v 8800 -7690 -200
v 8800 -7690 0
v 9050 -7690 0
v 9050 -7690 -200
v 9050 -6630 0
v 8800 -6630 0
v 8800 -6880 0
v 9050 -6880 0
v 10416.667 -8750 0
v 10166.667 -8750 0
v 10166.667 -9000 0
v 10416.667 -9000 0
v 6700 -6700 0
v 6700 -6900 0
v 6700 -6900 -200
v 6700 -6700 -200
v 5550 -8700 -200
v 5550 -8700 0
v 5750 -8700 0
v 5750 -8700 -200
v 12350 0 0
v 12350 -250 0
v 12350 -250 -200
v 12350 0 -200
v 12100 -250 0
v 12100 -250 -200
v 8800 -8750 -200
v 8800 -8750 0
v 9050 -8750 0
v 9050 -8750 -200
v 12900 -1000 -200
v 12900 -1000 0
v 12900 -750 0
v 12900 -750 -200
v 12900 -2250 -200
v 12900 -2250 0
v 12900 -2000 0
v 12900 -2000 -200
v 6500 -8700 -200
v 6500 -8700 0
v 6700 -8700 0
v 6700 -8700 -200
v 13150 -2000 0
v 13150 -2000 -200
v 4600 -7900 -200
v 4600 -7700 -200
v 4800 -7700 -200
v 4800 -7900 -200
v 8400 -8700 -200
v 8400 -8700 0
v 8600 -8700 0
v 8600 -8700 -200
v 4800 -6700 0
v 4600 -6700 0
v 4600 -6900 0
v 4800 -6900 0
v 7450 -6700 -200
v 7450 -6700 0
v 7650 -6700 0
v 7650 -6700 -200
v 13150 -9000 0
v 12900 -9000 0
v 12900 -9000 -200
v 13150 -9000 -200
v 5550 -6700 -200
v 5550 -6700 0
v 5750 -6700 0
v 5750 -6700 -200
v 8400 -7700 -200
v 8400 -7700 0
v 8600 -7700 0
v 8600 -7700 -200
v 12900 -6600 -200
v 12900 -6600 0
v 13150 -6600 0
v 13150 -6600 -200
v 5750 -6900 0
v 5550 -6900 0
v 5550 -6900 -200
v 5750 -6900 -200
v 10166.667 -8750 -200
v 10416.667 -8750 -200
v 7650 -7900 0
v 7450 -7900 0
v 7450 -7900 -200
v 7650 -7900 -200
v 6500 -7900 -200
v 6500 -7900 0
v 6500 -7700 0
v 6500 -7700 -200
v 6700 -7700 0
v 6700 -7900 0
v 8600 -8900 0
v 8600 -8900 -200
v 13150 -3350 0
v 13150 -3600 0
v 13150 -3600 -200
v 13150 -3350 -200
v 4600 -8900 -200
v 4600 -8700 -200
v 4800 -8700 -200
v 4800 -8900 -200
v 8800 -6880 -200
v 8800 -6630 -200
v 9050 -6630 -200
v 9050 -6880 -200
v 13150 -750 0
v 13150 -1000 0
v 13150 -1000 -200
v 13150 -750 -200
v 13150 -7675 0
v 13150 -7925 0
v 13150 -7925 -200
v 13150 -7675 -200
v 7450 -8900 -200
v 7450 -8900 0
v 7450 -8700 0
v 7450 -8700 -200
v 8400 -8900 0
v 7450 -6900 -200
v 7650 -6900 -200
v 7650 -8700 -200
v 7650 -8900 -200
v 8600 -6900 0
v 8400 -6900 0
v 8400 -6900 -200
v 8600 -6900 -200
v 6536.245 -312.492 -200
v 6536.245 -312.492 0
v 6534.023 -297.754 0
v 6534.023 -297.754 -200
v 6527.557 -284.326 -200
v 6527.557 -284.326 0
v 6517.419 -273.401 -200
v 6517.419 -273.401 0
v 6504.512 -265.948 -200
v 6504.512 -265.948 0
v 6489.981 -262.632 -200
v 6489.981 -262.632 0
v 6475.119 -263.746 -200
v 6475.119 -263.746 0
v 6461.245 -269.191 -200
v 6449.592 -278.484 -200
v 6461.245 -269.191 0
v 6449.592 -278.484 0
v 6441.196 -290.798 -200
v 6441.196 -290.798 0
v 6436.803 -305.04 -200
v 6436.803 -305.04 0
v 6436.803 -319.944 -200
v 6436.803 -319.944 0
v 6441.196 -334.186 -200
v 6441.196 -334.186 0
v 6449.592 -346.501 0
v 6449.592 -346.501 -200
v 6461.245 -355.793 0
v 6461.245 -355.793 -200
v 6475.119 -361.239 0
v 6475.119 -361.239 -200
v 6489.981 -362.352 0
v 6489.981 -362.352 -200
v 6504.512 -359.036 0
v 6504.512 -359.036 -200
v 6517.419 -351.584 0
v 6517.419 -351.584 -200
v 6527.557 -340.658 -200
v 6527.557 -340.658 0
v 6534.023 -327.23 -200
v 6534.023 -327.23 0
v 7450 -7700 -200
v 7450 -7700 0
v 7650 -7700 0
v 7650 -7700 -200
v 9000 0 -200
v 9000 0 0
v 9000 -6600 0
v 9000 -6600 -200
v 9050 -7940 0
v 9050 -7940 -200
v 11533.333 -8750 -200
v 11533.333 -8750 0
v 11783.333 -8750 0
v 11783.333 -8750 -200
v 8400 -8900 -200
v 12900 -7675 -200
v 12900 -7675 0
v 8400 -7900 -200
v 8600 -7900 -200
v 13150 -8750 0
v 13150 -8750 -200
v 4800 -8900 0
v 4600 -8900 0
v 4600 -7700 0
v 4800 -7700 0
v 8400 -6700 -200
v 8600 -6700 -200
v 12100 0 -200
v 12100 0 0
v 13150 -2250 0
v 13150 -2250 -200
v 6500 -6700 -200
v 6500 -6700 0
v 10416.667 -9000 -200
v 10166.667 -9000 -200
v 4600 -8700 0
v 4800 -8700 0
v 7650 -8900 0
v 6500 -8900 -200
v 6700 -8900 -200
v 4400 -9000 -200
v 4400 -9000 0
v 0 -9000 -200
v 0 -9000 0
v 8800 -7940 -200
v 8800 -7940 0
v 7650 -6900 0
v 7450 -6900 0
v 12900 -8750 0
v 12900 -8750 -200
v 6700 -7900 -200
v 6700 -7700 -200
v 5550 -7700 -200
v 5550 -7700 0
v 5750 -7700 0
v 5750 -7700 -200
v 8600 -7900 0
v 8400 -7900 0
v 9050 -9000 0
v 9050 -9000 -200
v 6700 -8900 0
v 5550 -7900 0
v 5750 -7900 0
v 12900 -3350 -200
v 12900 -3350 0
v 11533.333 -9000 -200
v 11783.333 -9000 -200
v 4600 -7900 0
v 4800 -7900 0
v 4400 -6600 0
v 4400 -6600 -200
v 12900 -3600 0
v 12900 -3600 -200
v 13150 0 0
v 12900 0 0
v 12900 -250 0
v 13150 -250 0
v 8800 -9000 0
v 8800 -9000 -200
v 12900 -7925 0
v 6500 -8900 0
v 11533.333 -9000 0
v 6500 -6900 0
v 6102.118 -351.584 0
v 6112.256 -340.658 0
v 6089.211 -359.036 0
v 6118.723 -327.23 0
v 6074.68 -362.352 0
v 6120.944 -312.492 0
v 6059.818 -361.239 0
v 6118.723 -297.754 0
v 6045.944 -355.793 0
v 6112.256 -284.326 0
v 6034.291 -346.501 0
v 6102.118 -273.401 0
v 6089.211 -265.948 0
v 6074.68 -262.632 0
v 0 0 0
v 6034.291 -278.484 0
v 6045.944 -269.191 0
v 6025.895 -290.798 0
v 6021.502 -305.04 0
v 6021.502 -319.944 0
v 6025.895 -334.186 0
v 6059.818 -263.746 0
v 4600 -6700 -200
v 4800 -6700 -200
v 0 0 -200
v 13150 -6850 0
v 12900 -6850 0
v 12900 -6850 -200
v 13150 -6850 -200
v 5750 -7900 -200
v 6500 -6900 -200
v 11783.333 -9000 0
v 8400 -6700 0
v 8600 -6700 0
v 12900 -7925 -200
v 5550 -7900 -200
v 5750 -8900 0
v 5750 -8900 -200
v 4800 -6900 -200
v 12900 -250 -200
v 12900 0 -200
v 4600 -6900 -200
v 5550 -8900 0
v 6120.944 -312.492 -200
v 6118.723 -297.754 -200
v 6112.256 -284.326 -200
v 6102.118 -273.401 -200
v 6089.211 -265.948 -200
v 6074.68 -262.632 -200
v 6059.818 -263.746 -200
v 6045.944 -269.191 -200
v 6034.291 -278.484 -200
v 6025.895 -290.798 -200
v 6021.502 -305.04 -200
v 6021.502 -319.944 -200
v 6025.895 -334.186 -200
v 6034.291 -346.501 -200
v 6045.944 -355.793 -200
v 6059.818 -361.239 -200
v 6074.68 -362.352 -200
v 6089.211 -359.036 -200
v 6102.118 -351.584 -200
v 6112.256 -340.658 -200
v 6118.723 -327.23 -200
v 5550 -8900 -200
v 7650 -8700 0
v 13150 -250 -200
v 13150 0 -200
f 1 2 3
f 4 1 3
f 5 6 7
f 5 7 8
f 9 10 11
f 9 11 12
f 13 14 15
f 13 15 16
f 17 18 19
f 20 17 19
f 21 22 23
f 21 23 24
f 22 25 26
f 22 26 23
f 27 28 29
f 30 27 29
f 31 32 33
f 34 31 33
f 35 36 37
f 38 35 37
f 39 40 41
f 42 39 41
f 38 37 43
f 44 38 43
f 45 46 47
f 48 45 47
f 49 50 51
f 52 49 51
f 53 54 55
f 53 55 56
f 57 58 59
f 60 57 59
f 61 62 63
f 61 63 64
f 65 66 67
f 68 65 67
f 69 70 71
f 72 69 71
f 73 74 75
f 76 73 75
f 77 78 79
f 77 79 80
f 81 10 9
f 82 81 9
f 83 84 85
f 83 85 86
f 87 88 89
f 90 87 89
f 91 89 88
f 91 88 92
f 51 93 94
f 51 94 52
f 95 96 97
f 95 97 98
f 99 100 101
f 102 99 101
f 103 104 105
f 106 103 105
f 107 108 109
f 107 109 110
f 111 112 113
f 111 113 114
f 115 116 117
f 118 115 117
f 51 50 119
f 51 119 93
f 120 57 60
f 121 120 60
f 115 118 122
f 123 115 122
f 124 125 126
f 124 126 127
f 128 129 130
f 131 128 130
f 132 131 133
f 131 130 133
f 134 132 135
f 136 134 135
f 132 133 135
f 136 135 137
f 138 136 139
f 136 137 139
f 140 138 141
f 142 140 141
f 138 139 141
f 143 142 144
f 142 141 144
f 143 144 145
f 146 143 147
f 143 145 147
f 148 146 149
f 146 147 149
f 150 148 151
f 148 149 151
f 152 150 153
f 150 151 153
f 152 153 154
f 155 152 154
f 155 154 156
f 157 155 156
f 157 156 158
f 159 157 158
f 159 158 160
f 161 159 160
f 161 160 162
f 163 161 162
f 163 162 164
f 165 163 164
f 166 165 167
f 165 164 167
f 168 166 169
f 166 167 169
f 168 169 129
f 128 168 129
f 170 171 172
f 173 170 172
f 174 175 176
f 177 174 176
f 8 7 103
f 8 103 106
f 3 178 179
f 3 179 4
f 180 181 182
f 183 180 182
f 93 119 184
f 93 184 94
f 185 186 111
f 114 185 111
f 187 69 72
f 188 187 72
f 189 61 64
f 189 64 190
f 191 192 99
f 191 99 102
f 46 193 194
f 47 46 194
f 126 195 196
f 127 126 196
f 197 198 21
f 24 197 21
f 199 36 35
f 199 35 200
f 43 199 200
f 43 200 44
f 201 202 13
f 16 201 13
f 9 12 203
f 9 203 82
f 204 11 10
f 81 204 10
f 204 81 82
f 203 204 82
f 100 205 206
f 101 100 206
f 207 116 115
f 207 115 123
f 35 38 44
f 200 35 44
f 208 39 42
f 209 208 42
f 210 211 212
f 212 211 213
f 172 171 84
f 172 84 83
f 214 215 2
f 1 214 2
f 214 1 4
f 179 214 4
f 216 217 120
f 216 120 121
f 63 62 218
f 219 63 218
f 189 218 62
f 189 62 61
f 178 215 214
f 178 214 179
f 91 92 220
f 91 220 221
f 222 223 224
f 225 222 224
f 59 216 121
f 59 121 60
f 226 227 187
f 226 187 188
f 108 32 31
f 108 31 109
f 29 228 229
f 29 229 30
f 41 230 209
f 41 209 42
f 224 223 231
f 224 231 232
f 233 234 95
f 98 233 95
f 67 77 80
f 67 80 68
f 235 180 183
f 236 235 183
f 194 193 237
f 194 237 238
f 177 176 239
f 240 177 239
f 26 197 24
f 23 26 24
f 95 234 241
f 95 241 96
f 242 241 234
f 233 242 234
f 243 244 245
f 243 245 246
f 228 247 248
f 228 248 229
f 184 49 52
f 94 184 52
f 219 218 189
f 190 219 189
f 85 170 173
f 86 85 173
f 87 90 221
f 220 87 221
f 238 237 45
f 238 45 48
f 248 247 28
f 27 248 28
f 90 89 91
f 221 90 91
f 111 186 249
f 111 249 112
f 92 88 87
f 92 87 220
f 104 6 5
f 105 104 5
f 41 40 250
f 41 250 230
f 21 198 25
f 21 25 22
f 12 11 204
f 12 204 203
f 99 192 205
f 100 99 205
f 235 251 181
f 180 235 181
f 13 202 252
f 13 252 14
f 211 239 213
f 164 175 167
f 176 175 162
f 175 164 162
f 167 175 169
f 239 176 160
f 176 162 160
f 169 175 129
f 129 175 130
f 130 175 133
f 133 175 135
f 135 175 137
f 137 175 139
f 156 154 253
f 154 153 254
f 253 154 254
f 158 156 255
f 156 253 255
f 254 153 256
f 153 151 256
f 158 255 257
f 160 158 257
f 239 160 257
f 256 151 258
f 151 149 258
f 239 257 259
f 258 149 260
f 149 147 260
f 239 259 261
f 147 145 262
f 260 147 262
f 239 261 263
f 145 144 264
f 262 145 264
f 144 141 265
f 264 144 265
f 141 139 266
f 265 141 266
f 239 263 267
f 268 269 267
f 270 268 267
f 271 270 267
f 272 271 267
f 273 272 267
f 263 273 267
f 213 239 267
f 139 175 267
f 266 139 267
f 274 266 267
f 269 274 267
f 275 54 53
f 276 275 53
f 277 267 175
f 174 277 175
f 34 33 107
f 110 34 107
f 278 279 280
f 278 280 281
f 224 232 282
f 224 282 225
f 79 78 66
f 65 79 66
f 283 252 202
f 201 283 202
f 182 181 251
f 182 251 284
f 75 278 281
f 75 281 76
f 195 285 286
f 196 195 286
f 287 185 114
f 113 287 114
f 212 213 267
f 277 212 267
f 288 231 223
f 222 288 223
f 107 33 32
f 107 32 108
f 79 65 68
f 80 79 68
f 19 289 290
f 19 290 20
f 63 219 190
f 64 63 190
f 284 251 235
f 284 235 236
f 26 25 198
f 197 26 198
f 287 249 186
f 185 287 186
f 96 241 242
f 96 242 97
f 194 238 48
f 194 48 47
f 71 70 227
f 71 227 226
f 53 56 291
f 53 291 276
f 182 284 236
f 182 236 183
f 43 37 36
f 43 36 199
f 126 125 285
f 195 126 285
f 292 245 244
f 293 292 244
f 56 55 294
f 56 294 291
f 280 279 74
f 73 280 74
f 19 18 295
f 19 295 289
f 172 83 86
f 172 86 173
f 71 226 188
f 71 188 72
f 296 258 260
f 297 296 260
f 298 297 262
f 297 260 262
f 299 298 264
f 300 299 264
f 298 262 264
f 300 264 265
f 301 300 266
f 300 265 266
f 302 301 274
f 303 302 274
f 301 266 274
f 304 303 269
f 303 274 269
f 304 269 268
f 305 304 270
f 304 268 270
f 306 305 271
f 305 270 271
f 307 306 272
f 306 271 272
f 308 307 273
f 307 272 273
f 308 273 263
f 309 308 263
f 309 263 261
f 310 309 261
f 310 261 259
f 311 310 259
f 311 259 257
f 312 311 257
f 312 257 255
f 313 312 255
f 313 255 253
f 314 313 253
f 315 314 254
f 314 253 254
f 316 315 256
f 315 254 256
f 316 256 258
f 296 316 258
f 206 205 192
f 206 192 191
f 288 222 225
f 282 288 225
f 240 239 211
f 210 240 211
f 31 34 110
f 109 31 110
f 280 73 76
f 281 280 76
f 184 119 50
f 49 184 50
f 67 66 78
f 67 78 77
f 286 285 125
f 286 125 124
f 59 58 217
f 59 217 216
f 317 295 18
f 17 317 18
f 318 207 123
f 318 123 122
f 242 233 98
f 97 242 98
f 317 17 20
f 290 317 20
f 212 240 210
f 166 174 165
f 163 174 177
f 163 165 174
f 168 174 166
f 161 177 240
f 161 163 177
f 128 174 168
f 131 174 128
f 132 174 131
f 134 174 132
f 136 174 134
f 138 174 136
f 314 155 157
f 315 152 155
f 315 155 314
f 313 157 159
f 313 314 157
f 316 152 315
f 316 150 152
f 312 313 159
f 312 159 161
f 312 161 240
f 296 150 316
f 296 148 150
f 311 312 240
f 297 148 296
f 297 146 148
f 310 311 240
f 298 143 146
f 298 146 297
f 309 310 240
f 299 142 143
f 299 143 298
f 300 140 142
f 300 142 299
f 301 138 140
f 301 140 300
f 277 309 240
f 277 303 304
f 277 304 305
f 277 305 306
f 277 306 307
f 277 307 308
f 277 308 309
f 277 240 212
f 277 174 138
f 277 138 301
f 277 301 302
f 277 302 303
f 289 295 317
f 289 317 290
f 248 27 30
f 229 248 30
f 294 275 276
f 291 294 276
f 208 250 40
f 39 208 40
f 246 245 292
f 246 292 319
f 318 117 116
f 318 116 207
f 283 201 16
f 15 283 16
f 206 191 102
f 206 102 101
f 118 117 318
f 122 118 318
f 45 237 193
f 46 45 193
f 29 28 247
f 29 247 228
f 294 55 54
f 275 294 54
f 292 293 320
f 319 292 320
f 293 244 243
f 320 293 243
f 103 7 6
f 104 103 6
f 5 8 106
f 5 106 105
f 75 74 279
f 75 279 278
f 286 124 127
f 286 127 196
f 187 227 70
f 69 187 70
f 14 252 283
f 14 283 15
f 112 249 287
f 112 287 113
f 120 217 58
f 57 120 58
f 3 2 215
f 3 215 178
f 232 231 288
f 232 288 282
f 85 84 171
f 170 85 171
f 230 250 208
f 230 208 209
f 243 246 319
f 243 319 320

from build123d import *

# Parameters (mm, degrees)
SKETCH_1_R         = 50
EXTRUDE_1_DEPTH    = 200
SKETCH_1_W         = 250
SKETCH_1_H         = 250
EXTRUDE_1_2_DEPTH  = 200
EXTRUDE_1_3_DEPTH  = 200
EXTRUDE_1_4_DEPTH  = 200
EXTRUDE_1_5_DEPTH  = 200
EXTRUDE_1_6_DEPTH  = 200
EXTRUDE_1_7_DEPTH  = 200
EXTRUDE_1_8_DEPTH  = 200
EXTRUDE_1_9_DEPTH  = 200
EXTRUDE_1_10_DEPTH = 200
EXTRUDE_1_11_DEPTH = 200
EXTRUDE_1_12_DEPTH = 200
EXTRUDE_1_13_DEPTH = 200
EXTRUDE_1_14_DEPTH = 200
SKETCH_1_W_2       = 200
SKETCH_1_H_2       = 200
EXTRUDE_1_15_DEPTH = 200
EXTRUDE_1_16_DEPTH = 200
EXTRUDE_1_17_DEPTH = 200
EXTRUDE_1_18_DEPTH = 200
EXTRUDE_1_19_DEPTH = 200
EXTRUDE_1_20_DEPTH = 200
EXTRUDE_1_21_DEPTH = 200
EXTRUDE_1_22_DEPTH = 200
EXTRUDE_1_23_DEPTH = 200
EXTRUDE_1_24_DEPTH = 200
EXTRUDE_1_25_DEPTH = 200
EXTRUDE_1_26_DEPTH = 200
EXTRUDE_1_27_DEPTH = 200
EXTRUDE_1_28_DEPTH = 200
EXTRUDE_1_29_DEPTH = 200


with BuildPart() as part:
    # Эскиз1 → Бобышка-Вытянуть1 (new body)
    with BuildSketch(Plane.XY):
        Polygon((0, 0), (9000, 0), (9000, -6600), (4400, -6600), (4400, -9000), (0, -9000), align=None)
        with Locations((6486.244831881, -312.492160742)):
            Circle(SKETCH_1_R, mode=Mode.SUBTRACT)
        with Locations((6070.943926101, -312.492160742)):
            Circle(SKETCH_1_R, mode=Mode.SUBTRACT)
    extrude(amount=-EXTRUDE_1_DEPTH)


with BuildPart() as body_2:
    # Эскиз1 → Extrude 1 2 (new body)
    with BuildSketch(Plane.XY):
        with Locations((8925, -8875)):
            Rectangle(SKETCH_1_W, SKETCH_1_H)
    extrude(amount=-EXTRUDE_1_2_DEPTH)


with BuildPart() as body_3:
    # Эскиз1 → Extrude 1 3 (new body)
    with BuildSketch(Plane.XY):
        with Locations((8925, -6755)):
            Rectangle(SKETCH_1_W, SKETCH_1_H)
    extrude(amount=-EXTRUDE_1_3_DEPTH)


with BuildPart() as body_4:
    # Эскиз1 → Extrude 1 4 (new body)
    with BuildSketch(Plane.XY):
        with Locations((8925, -7815)):
            Rectangle(SKETCH_1_W, SKETCH_1_H)
    extrude(amount=-EXTRUDE_1_4_DEPTH)


with BuildPart() as body_5:
    # Эскиз1 → Extrude 1 5 (new body)
    with BuildSketch(Plane.XY):
        with Locations((10291.666666667, -8875)):
            Rectangle(SKETCH_1_W, SKETCH_1_H)
    extrude(amount=-EXTRUDE_1_5_DEPTH)


with BuildPart() as body_6:
    # Эскиз1 → Extrude 1 6 (new body)
    with BuildSketch(Plane.XY):
        with Locations((11658.333333333, -8875)):
            Rectangle(SKETCH_1_W, SKETCH_1_H)
    extrude(amount=-EXTRUDE_1_6_DEPTH)


with BuildPart() as body_7:
    # Эскиз1 → Extrude 1 7 (new body)
    with BuildSketch(Plane.XY):
        with Locations((13025, -8875)):
            Rectangle(SKETCH_1_W, SKETCH_1_H)
    extrude(amount=-EXTRUDE_1_7_DEPTH)


with BuildPart() as body_8:
    # Эскиз1 → Extrude 1 8 (new body)
    with BuildSketch(Plane.XY):
        with Locations((13025, -6725)):
            Rectangle(SKETCH_1_W, SKETCH_1_H)
    extrude(amount=-EXTRUDE_1_8_DEPTH)


with BuildPart() as body_9:
    # Эскиз1 → Extrude 1 9 (new body)
    with BuildSketch(Plane.XY):
        with Locations((13025, -7800)):
            Rectangle(SKETCH_1_W, SKETCH_1_H)
    extrude(amount=-EXTRUDE_1_9_DEPTH)


with BuildPart() as body_10:
    # Эскиз1 → Extrude 1 10 (new body)
    with BuildSketch(Plane.XY):
        with Locations((13025, -3475)):
            Rectangle(SKETCH_1_W, SKETCH_1_H)
    extrude(amount=-EXTRUDE_1_10_DEPTH)


with BuildPart() as body_11:
    # Эскиз1 → Extrude 1 11 (new body)
    with BuildSketch(Plane.XY):
        with Locations((13025, -2125)):
            Rectangle(SKETCH_1_W, SKETCH_1_H)
    extrude(amount=-EXTRUDE_1_11_DEPTH)


with BuildPart() as body_12:
    # Эскиз1 → Extrude 1 12 (new body)
    with BuildSketch(Plane.XY):
        with Locations((13025, -875)):
            Rectangle(SKETCH_1_W, SKETCH_1_H)
    extrude(amount=-EXTRUDE_1_12_DEPTH)


with BuildPart() as body_13:
    # Эскиз1 → Extrude 1 13 (new body)
    with BuildSketch(Plane.XY):
        with Locations((13025, -125)):
            Rectangle(SKETCH_1_W, SKETCH_1_H)
    extrude(amount=-EXTRUDE_1_13_DEPTH)


with BuildPart() as body_14:
    # Эскиз1 → Extrude 1 14 (new body)
    with BuildSketch(Plane.XY):
        with Locations((12225, -125)):
            Rectangle(SKETCH_1_W, SKETCH_1_H)
    extrude(amount=-EXTRUDE_1_14_DEPTH)


with BuildPart() as body_15:
    # Эскиз1 → Extrude 1 15 (new body)
    with BuildSketch(Plane.XY):
        with Locations((4700, -6800)):
            Rectangle(SKETCH_1_W_2, SKETCH_1_H_2)
    extrude(amount=-EXTRUDE_1_15_DEPTH)


with BuildPart() as body_16:
    # Эскиз1 → Extrude 1 16 (new body)
    with BuildSketch(Plane.XY):
        with Locations((4700, -7800)):
            Rectangle(SKETCH_1_W_2, SKETCH_1_H_2)
    extrude(amount=-EXTRUDE_1_16_DEPTH)


with BuildPart() as body_17:
    # Эскиз1 → Extrude 1 17 (new body)
    with BuildSketch(Plane.XY):
        with Locations((4700, -8800)):
            Rectangle(SKETCH_1_W_2, SKETCH_1_H_2)
    extrude(amount=-EXTRUDE_1_17_DEPTH)


with BuildPart() as body_18:
    # Эскиз1 → Extrude 1 18 (new body)
    with BuildSketch(Plane.XY):
        with Locations((5650, -6800)):
            Rectangle(SKETCH_1_W_2, SKETCH_1_H_2)
    extrude(amount=-EXTRUDE_1_18_DEPTH)


with BuildPart() as body_19:
    # Эскиз1 → Extrude 1 19 (new body)
    with BuildSketch(Plane.XY):
        with Locations((5650, -7800)):
            Rectangle(SKETCH_1_W_2, SKETCH_1_H_2)
    extrude(amount=-EXTRUDE_1_19_DEPTH)


with BuildPart() as body_20:
    # Эскиз1 → Extrude 1 20 (new body)
    with BuildSketch(Plane.XY):
        with Locations((5650, -8800)):
            Rectangle(SKETCH_1_W_2, SKETCH_1_H_2)
    extrude(amount=-EXTRUDE_1_20_DEPTH)


with BuildPart() as body_21:
    # Эскиз1 → Extrude 1 21 (new body)
    with BuildSketch(Plane.XY):
        with Locations((6600, -6800)):
            Rectangle(SKETCH_1_W_2, SKETCH_1_H_2)
    extrude(amount=-EXTRUDE_1_21_DEPTH)


with BuildPart() as body_22:
    # Эскиз1 → Extrude 1 22 (new body)
    with BuildSketch(Plane.XY):
        with Locations((6600, -7800)):
            Rectangle(SKETCH_1_W_2, SKETCH_1_H_2)
    extrude(amount=-EXTRUDE_1_22_DEPTH)


with BuildPart() as body_23:
    # Эскиз1 → Extrude 1 23 (new body)
    with BuildSketch(Plane.XY):
        with Locations((6600, -8800)):
            Rectangle(SKETCH_1_W_2, SKETCH_1_H_2)
    extrude(amount=-EXTRUDE_1_23_DEPTH)


with BuildPart() as body_24:
    # Эскиз1 → Extrude 1 24 (new body)
    with BuildSketch(Plane.XY):
        with Locations((7550, -6800)):
            Rectangle(SKETCH_1_W_2, SKETCH_1_H_2)
    extrude(amount=-EXTRUDE_1_24_DEPTH)


with BuildPart() as body_25:
    # Эскиз1 → Extrude 1 25 (new body)
    with BuildSketch(Plane.XY):
        with Locations((7550, -7800)):
            Rectangle(SKETCH_1_W_2, SKETCH_1_H_2)
    extrude(amount=-EXTRUDE_1_25_DEPTH)


with BuildPart() as body_26:
    # Эскиз1 → Extrude 1 26 (new body)
    with BuildSketch(Plane.XY):
        with Locations((7550, -8800)):
            Rectangle(SKETCH_1_W_2, SKETCH_1_H_2)
    extrude(amount=-EXTRUDE_1_26_DEPTH)


with BuildPart() as body_27:
    # Эскиз1 → Extrude 1 27 (new body)
    with BuildSketch(Plane.XY):
        with Locations((8500, -6800)):
            Rectangle(SKETCH_1_W_2, SKETCH_1_H_2)
    extrude(amount=-EXTRUDE_1_27_DEPTH)


with BuildPart() as body_28:
    # Эскиз1 → Extrude 1 28 (new body)
    with BuildSketch(Plane.XY):
        with Locations((8500, -7800)):
            Rectangle(SKETCH_1_W_2, SKETCH_1_H_2)
    extrude(amount=-EXTRUDE_1_28_DEPTH)


with BuildPart() as body_29:
    # Эскиз1 → Extrude 1 29 (new body)
    with BuildSketch(Plane.XY):
        with Locations((8500, -8800)):
            Rectangle(SKETCH_1_W_2, SKETCH_1_H_2)
    extrude(amount=-EXTRUDE_1_29_DEPTH)


solid = Compound([part.part, body_2.part, body_3.part, body_4.part, body_5.part, body_6.part, body_7.part, body_8.part, body_9.part, body_10.part, body_11.part, body_12.part, body_13.part, body_14.part, body_15.part, body_16.part, body_17.part, body_18.part, body_19.part, body_20.part, body_21.part, body_22.part, body_23.part, body_24.part, body_25.part, body_26.part, body_27.part, body_28.part, body_29.part])
